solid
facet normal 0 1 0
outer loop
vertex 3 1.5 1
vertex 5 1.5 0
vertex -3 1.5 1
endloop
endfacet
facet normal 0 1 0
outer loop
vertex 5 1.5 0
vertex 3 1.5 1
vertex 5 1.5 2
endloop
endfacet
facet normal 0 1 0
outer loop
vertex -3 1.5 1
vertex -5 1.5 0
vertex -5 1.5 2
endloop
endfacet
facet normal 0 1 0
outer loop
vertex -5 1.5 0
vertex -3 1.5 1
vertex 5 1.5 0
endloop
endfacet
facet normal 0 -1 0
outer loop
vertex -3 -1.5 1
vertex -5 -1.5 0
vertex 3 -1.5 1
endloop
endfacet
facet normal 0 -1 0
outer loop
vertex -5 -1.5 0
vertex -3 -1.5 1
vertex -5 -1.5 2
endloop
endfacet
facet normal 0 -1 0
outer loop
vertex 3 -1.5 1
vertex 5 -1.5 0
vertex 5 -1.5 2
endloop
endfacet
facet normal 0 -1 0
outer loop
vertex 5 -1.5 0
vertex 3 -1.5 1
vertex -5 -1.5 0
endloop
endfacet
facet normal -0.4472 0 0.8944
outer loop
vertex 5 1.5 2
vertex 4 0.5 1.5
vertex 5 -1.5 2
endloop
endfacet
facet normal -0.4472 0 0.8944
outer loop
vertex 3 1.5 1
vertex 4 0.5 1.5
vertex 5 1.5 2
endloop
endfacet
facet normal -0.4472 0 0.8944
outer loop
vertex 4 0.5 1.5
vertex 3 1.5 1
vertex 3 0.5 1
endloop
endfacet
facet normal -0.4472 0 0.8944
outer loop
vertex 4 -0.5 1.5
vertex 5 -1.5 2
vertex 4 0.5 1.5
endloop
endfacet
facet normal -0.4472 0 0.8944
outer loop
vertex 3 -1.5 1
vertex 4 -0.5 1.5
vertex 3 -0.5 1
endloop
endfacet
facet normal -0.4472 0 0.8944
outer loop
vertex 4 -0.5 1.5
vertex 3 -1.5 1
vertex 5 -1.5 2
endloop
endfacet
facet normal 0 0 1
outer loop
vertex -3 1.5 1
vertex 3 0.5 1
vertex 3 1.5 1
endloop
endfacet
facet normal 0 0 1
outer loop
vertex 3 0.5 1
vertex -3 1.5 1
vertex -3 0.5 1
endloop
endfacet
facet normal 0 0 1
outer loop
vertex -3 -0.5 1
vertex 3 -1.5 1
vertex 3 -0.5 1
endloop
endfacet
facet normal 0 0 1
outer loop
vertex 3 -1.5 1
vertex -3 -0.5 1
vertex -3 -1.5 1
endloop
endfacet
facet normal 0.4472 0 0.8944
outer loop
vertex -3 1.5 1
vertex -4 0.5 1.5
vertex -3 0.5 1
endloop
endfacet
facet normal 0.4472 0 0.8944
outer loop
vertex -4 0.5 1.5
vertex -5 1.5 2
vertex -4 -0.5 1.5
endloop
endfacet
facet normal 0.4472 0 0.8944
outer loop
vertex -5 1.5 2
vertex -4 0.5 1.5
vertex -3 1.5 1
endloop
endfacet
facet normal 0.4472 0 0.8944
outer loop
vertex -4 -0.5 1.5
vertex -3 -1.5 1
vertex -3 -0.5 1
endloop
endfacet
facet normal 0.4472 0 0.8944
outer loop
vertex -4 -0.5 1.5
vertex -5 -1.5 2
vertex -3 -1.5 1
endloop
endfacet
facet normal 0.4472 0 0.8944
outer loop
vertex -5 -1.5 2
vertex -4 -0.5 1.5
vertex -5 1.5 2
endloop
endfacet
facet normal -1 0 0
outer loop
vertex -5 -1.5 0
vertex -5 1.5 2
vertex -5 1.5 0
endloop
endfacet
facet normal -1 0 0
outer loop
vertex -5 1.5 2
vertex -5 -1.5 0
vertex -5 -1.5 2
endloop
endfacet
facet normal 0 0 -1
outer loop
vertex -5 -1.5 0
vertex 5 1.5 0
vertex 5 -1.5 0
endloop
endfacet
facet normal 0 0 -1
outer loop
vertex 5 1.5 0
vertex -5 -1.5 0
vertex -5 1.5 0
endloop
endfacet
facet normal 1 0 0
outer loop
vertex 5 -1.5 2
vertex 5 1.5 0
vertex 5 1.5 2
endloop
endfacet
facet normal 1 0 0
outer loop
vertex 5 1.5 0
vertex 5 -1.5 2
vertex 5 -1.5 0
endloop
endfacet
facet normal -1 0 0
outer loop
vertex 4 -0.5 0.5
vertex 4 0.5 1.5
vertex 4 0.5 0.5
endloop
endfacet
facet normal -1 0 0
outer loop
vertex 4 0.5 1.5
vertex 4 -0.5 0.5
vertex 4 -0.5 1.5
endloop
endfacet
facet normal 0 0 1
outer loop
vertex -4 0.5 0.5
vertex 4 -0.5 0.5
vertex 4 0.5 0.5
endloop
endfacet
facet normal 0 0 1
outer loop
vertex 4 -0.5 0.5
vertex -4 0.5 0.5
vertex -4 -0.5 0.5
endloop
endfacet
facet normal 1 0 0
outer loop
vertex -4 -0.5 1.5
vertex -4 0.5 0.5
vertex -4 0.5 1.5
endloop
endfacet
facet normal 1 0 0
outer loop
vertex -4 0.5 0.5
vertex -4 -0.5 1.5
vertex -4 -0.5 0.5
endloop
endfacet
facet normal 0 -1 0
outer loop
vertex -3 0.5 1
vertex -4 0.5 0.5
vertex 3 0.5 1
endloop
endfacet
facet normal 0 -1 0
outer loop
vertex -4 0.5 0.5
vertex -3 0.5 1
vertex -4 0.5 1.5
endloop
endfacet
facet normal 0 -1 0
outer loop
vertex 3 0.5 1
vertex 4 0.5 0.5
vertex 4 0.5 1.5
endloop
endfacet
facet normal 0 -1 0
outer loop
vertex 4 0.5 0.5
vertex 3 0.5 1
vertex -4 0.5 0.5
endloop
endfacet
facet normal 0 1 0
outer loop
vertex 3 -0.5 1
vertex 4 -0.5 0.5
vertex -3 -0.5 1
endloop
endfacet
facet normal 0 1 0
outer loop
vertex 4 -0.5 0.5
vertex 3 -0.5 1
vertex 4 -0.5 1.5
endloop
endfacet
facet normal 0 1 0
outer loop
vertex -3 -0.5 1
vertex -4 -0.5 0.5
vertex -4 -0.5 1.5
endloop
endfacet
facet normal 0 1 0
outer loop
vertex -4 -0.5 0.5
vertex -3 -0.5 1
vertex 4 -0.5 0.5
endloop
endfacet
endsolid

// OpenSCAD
/* Card holder constants. */
W_CH = 10;
H_CH = 2;
D_CH = 3;
W_OFFSET_CH = 2;
H_OFFSET_CH = 1;

/* Sink constants */
W_C = 8;
H_C = 2;
D_C = 1;
H_OFFSET_C = 1;

/* The base of the card holder.
*/
module base(w, h, d, wo, ho) {
    points = [
        [0, 0],
        [w, 0],
        [0, h],
        [w, h],
        [wo, ho],
        [w - wo, h - ho],
    ];

    path = [0, 1, 3, 5, 4, 2];

    translate([-w/2, d/2, 0])
    rotate([90, 0, 0])
    linear_extrude(d) {
        polygon(points, [path]);
    }
}

/* The square to remove from the base.
*/
module sink(w, h, d, ho) {
    translate([0, 0, 3/2 * ho])
    cube([w, d, h], center=true);
}


difference() {
    base(W_CH, H_CH, D_CH, W_OFFSET_CH, H_OFFSET_CH);
    sink(W_C, H_C, D_C, H_OFFSET_C);
}
